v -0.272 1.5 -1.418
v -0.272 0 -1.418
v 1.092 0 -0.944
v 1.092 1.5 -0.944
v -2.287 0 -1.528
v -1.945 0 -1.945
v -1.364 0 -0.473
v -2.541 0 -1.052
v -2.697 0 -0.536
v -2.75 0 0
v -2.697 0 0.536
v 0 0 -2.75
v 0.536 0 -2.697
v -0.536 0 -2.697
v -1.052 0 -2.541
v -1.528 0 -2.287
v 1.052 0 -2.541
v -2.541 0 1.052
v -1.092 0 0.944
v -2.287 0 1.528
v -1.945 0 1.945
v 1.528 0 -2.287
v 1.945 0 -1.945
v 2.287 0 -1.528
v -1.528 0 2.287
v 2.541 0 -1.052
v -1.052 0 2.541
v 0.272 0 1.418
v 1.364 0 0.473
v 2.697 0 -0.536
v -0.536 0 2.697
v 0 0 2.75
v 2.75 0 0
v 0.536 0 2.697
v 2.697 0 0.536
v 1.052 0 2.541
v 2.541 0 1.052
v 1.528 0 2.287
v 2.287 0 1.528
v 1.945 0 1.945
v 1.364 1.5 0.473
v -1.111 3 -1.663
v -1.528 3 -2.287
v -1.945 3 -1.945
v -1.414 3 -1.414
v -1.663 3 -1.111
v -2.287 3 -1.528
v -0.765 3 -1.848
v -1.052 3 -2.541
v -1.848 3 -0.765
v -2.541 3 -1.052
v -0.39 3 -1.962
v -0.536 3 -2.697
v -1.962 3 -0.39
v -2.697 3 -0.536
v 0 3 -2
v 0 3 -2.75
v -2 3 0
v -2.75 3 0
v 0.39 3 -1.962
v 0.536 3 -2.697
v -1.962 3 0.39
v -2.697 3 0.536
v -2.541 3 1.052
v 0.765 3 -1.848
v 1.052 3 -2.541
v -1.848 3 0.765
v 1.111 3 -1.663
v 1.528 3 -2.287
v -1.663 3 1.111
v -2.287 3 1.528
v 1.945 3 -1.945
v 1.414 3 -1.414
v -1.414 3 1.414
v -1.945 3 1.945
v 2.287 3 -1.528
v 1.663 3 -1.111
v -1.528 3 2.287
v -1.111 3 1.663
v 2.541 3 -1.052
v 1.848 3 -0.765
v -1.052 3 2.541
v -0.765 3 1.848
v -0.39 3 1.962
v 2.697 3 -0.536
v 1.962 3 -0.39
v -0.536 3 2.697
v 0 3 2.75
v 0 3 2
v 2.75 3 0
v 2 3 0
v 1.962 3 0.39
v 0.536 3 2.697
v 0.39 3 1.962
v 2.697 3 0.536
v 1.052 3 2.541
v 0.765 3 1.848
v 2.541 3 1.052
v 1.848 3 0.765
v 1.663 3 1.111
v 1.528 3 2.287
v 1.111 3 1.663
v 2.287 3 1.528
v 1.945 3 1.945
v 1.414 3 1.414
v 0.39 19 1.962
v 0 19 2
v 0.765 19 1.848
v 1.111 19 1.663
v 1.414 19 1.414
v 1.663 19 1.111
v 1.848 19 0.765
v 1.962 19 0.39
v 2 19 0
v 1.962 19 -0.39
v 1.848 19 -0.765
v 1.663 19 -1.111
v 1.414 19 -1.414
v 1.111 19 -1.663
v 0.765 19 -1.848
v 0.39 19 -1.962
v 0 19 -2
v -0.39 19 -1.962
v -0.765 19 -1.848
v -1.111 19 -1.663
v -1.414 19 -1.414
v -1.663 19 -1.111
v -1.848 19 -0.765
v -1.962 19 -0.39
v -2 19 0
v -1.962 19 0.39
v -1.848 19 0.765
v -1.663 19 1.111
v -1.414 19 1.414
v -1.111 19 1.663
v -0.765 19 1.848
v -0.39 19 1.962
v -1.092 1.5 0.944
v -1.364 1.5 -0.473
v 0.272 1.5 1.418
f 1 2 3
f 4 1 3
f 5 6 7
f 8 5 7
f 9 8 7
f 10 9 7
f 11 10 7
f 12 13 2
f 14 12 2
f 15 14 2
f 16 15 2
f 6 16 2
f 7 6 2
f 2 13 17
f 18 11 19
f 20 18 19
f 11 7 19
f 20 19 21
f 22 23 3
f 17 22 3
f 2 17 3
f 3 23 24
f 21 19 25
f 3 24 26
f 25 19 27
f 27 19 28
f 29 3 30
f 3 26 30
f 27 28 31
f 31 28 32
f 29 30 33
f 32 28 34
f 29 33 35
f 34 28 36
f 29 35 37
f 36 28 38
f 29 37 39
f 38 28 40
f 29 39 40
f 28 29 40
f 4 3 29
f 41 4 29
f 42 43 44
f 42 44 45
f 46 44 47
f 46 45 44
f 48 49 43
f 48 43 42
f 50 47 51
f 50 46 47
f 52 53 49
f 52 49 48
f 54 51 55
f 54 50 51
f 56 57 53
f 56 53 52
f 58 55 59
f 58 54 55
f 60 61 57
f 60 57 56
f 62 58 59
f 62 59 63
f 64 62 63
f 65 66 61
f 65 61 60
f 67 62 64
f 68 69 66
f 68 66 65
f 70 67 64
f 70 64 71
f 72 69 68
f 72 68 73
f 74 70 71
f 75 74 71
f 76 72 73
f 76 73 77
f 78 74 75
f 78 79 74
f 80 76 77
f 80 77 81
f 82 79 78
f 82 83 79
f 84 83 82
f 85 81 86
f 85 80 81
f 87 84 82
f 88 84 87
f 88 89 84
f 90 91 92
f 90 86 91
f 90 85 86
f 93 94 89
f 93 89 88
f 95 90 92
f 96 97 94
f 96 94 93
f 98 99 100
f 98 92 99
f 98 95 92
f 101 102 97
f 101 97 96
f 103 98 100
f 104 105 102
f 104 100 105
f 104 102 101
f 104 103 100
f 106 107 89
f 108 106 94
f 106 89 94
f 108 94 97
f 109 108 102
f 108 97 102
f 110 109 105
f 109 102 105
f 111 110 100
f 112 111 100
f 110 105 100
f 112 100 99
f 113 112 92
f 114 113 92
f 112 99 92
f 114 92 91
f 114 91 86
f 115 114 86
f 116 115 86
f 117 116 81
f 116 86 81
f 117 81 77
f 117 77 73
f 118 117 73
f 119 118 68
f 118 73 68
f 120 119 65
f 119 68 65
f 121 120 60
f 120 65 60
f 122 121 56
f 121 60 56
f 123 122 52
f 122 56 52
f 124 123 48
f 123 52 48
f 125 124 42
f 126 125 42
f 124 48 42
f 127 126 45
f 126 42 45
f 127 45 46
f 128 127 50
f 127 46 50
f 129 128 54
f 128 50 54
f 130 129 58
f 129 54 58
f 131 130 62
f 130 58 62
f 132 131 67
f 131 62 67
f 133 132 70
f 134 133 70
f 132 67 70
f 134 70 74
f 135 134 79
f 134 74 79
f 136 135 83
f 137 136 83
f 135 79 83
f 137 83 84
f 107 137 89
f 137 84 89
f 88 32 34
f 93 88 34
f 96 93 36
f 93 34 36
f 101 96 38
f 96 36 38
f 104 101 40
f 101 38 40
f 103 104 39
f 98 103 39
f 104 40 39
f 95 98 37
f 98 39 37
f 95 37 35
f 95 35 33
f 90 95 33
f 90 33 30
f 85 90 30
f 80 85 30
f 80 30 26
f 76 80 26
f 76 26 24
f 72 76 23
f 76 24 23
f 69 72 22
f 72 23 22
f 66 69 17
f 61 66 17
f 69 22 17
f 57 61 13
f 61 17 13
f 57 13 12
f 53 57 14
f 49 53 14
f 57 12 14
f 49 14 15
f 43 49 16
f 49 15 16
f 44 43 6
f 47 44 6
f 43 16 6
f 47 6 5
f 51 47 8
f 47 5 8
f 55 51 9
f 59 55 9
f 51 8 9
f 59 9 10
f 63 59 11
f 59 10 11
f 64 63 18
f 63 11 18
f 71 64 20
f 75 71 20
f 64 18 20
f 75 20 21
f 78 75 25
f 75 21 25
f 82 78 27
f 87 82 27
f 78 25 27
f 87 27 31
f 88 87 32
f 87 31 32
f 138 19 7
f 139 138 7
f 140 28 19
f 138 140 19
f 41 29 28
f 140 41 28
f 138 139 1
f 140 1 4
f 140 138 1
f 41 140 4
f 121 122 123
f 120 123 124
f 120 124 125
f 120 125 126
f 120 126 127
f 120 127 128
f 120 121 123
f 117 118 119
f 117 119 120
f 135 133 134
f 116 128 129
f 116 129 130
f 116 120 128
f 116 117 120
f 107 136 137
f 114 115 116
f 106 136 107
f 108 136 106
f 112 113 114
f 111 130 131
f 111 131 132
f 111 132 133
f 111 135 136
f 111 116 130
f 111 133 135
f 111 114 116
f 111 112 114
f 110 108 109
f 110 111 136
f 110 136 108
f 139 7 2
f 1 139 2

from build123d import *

# Parameters (mm, degrees)
SKETCH_1_R          = 2.75
EXTRUDE_1_DEPTH     = 3
SKETCH_2_R          = 2
EXTRUDE_2_DEPTH     = 16
CUT_EXTRUDE_1_DEPTH = 1.5


with BuildPart() as part:
    # 草图1 → 凸台-拉伸1 (new body)
    with BuildSketch(Plane(origin=(0, 0, 0), x_dir=(1, 0, 0), z_dir=(0, 1, 0))):
        with Locations(Location((0, 0, 0), (0, 0, 270))):
            Circle(SKETCH_1_R)
    extrude(amount=EXTRUDE_1_DEPTH)

    # 草图2 → 凸台-拉伸2 (add)
    with BuildSketch(Plane(origin=(0, 3, 0), x_dir=(1, 0, 0), z_dir=(0, 1, 0))):
        with Locations(Location((0, 0, 0), (0, 0, 270))):
            Circle(SKETCH_2_R)
    extrude(amount=EXTRUDE_2_DEPTH)

    # 草图3 → 切除-拉伸1 (cut)
    with BuildSketch(Plane.XZ):
        Polygon((1.091681609, -0.944226984), (1.36356536, 0.473310514), (0.271883751, 1.417537498), (-1.091681609, 0.944226984), (-1.36356536, -0.473310514), (-0.271883751, -1.417537498), align=None)
    extrude(amount=-CUT_EXTRUDE_1_DEPTH, mode=Mode.SUBTRACT)


solid = part.part
